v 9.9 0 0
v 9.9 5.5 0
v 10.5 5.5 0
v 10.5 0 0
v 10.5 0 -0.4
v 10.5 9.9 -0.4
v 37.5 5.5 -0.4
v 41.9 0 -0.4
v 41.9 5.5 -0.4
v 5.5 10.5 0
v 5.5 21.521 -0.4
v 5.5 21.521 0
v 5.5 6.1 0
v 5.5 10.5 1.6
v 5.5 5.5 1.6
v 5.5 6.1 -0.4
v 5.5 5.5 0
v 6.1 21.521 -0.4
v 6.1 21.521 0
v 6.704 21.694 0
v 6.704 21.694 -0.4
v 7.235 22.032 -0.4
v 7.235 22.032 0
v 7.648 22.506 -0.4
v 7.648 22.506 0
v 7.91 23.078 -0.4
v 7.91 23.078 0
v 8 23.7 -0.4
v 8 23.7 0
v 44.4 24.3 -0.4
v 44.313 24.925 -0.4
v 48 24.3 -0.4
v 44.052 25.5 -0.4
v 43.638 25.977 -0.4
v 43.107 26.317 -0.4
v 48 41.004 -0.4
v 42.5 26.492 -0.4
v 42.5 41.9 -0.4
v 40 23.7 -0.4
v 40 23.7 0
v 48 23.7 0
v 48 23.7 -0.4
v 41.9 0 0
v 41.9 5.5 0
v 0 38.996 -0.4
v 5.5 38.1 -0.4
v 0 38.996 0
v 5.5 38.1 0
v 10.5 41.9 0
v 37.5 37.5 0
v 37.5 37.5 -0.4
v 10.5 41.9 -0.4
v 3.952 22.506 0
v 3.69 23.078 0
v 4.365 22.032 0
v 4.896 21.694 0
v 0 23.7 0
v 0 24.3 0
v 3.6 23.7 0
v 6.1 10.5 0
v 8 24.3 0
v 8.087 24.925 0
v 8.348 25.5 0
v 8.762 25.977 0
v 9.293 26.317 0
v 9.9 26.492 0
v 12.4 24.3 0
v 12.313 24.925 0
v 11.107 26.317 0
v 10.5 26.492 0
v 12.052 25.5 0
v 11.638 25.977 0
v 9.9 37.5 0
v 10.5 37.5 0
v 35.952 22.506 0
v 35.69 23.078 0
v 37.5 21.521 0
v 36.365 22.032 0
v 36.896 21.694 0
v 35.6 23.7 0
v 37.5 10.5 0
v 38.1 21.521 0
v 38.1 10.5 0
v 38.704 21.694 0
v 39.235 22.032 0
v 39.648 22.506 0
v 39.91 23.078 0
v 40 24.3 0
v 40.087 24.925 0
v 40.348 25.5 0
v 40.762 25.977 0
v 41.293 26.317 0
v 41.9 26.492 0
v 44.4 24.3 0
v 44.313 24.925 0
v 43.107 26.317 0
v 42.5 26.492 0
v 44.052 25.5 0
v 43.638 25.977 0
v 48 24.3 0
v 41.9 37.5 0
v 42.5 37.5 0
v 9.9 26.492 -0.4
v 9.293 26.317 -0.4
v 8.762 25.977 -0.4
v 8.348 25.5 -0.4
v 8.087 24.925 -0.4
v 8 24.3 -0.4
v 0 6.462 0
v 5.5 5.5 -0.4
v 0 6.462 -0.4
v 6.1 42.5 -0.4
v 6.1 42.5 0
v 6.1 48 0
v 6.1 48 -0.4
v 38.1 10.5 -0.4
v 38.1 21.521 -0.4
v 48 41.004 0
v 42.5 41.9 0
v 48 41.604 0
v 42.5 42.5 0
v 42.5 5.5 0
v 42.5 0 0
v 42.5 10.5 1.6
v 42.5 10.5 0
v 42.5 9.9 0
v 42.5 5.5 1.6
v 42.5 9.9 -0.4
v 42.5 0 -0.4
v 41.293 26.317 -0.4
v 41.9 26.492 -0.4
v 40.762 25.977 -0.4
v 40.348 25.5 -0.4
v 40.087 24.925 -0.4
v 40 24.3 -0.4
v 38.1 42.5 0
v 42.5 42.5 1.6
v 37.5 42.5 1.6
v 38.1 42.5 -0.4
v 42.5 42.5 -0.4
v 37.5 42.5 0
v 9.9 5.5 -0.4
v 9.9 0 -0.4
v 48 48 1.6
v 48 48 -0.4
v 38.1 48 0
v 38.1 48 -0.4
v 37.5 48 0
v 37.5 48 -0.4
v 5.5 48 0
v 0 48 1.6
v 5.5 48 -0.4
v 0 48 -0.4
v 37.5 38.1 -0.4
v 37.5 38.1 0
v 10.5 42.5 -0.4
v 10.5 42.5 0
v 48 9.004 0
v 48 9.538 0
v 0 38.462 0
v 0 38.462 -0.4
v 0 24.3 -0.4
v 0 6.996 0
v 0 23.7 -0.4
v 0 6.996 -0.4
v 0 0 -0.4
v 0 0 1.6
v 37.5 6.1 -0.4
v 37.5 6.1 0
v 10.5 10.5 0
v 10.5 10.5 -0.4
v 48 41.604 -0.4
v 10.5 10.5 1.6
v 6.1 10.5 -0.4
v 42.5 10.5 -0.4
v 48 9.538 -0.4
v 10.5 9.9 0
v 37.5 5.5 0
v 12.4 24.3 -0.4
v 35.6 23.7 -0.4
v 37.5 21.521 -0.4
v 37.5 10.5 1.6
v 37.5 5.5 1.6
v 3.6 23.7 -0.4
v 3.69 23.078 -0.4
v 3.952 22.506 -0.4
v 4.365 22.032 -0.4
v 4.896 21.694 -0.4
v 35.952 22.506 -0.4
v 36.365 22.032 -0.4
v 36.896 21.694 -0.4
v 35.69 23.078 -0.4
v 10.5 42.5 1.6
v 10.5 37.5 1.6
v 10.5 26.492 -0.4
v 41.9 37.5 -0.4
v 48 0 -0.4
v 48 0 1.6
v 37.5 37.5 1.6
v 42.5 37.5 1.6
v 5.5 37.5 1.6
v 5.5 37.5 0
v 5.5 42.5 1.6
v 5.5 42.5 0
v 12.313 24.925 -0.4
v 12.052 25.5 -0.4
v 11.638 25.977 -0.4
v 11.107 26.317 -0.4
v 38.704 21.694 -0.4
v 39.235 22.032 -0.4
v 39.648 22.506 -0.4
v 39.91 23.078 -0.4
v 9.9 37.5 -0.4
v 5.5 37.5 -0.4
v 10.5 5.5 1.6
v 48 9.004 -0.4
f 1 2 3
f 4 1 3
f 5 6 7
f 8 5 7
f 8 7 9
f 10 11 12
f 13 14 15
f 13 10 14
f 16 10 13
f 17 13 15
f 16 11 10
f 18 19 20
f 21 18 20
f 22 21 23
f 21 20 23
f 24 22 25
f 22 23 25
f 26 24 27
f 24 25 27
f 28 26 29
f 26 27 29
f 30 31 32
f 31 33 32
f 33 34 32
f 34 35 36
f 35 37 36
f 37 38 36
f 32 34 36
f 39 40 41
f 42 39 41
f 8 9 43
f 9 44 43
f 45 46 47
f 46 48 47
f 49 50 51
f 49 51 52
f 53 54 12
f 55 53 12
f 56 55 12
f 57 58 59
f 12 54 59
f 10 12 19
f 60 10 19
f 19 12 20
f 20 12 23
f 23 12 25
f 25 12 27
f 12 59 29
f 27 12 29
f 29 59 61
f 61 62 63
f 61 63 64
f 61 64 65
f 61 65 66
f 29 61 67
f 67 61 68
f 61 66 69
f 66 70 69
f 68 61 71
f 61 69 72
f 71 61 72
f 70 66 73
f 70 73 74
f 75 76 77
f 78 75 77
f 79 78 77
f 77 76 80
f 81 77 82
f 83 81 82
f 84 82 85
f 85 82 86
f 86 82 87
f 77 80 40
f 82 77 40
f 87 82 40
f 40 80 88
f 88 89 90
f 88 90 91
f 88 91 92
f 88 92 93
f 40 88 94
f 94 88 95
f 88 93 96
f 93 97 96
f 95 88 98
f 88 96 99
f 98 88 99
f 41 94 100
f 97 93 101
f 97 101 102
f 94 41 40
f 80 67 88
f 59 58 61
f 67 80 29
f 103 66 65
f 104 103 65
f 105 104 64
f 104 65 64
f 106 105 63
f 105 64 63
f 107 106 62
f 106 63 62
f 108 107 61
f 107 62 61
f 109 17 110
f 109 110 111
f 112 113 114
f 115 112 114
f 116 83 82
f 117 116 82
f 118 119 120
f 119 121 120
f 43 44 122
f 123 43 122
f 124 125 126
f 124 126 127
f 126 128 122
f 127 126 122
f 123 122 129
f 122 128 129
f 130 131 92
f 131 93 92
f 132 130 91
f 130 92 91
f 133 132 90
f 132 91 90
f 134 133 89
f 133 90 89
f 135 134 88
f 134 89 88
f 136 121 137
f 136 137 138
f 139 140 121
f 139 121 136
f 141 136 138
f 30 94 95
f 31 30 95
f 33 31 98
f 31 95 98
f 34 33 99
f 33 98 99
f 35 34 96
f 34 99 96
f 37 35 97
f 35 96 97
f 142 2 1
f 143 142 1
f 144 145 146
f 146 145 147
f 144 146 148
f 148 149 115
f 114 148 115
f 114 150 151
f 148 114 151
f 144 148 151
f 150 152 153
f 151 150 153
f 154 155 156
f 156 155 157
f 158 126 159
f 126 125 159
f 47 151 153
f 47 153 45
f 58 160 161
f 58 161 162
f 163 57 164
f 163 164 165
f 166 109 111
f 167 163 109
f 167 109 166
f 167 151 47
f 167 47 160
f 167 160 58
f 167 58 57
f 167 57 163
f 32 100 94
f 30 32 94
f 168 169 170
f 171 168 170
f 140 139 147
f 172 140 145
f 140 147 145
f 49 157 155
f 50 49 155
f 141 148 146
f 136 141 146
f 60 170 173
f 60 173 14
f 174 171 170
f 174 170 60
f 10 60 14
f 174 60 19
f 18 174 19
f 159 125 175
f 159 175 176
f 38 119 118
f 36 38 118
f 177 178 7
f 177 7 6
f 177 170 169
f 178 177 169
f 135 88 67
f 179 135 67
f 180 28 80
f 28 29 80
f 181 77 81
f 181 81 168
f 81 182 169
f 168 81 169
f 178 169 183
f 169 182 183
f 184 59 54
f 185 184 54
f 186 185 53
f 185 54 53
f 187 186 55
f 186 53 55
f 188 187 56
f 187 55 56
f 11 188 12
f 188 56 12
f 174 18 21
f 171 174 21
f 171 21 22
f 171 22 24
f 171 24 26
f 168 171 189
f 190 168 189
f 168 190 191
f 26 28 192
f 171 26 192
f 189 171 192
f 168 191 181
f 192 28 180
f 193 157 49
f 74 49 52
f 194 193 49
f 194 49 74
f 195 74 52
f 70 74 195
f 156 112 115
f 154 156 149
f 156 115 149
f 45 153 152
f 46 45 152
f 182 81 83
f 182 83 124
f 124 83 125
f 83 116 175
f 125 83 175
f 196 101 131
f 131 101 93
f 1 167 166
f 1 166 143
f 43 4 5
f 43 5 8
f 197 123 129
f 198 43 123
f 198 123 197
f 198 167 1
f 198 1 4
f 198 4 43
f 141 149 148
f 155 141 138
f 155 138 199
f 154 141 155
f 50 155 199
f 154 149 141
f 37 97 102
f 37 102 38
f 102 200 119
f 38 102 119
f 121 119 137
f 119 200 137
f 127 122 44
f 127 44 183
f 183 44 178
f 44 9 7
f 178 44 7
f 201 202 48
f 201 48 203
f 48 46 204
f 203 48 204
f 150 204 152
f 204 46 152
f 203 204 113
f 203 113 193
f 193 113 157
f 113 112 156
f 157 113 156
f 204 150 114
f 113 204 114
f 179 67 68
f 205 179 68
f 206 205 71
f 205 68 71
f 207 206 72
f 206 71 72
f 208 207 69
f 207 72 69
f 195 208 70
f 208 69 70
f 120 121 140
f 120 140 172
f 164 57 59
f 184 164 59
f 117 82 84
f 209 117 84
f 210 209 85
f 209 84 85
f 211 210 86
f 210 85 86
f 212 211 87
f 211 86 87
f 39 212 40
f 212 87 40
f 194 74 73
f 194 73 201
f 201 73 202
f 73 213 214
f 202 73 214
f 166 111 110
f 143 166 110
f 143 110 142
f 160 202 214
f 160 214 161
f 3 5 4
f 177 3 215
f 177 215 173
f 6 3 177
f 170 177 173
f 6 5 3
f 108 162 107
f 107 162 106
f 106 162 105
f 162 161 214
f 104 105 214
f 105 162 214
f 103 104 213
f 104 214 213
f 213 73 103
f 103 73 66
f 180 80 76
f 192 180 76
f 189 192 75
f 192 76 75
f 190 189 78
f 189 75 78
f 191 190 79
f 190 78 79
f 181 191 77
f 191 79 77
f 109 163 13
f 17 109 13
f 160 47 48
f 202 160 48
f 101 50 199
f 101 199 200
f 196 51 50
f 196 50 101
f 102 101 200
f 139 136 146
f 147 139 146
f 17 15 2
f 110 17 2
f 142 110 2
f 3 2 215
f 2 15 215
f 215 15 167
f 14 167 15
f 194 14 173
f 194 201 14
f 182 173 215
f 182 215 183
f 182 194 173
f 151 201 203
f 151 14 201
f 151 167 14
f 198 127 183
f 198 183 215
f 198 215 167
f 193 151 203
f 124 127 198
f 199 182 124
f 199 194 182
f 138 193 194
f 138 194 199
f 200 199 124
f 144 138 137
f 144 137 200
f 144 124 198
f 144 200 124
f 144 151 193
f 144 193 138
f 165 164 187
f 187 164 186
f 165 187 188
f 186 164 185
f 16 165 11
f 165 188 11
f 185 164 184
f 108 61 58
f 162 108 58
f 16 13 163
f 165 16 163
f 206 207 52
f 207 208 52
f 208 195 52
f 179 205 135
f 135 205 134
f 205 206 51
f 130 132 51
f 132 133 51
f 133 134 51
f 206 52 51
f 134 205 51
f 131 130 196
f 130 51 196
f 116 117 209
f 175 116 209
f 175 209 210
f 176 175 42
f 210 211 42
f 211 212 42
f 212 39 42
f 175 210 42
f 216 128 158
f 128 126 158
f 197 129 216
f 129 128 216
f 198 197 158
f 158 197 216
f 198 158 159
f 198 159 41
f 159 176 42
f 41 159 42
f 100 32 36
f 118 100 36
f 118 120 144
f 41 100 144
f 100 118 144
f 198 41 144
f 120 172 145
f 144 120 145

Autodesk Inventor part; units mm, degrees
ref_plane "YZ Plane" through (0, 0, 0) normal (1, 0, 0) x (0, 1, 0)
ref_plane "XZ Plane" through (0, 0, 0) normal (0, 1, 0) x (-1, 0, 0)
ref_plane "XY Plane" through (0, 0, 0) normal (0, 0, 1) x (1, 0, 0)
sketch "Sketch1" plane through (0, 0, 0) normal (0, 0, 1) x (1, 0, 0)
  line L0 (0, 0) -> (48, 0)
  line L1 (48, 0) -> (48, 48)
  line L2 (48, 48) -> (0, 48)
  line L3 (0, 48) -> (0, 0)
  line L4 (10.5, 10.5) -> (5.5, 10.5)
  line L5 (5.5, 10.5) -> (5.5, 5.5)
  line L6 (5.5, 5.5) -> (10.5, 5.5)
  line L7 (10.5, 5.5) -> (10.5, 10.5)
  line L8 (10.5, 10.5) -> (5.5, 5.5) construction
  line L9 (5.5, 10.5) -> (10.5, 5.5) construction
  line L10 (5.5, 42.5) -> (10.5, 42.5)
  line L11 (10.5, 42.5) -> (10.5, 37.5)
  line L12 (10.5, 37.5) -> (5.5, 37.5)
  line L13 (5.5, 37.5) -> (5.5, 42.5)
  line L14 (5.5, 42.5) -> (10.5, 37.5) construction
  line L15 (10.5, 42.5) -> (5.5, 37.5) construction
  line L16 (42.5, 5.5) -> (37.5, 5.5)
  line L17 (37.5, 5.5) -> (37.5, 10.5)
  line L18 (37.5, 10.5) -> (42.5, 10.5)
  line L19 (42.5, 10.5) -> (42.5, 5.5)
  line L20 (42.5, 5.5) -> (37.5, 10.5) construction
  line L21 (37.5, 5.5) -> (42.5, 10.5) construction
  line L22 (42.5, 42.5) -> (37.5, 42.5)
  line L23 (37.5, 42.5) -> (37.5, 37.5)
  line L24 (37.5, 37.5) -> (42.5, 37.5)
  line L25 (42.5, 37.5) -> (42.5, 42.5)
  line L26 (42.5, 42.5) -> (37.5, 37.5) construction
  line L27 (37.5, 42.5) -> (42.5, 37.5) construction
  line L28 (37.5, 5.5) -> (37.5, 6.1)
  line L29 (37.5, 6.1) -> (10.5, 10.5)
  line L30 (37.5, 5.5) -> (10.5, 9.9)
  line L31 (37.5, 37.5) -> (37.5, 38.1)
  line L32 (37.5, 38.1) -> (10.5, 42.5)
  line L33 (37.5, 37.5) -> (10.5, 41.9)
  line L34 (0, 24) -> (0, 23.7)
  line L35 (0, 23.7) -> (48, 23.7)
  line L36 (48, 23.7) -> (48, 24.3)
  line L37 (48, 24.3) -> (0, 24.3)
  line L38 (0, 24.3) -> (0, 23.7)
  line L39 (5.5, 10.5) -> (6.1, 10.5)
  line L40 (6.1, 10.5) -> (6.1, 23.7)
  line L41 (6.1, 23.7) -> (5.5, 23.7)
  line L42 (5.5, 23.7) -> (5.5, 10.5)
  line L43 (10.5, 37.5) -> (9.9, 37.5)
  line L44 (9.9, 37.5) -> (9.9, 24.3)
  line L45 (9.9, 24.3) -> (10.5, 24.3)
  line L46 (10.5, 24.3) -> (10.5, 37.5)
  line L47 (37.5, 10.5) -> (38.1, 10.5)
  line L48 (38.1, 10.5) -> (38.1, 23.7)
  line L49 (38.1, 23.7) -> (37.5, 23.7)
  line L50 (37.5, 23.7) -> (37.5, 10.5)
  line L51 (42.5, 37.5) -> (41.9, 37.5)
  line L52 (41.9, 37.5) -> (41.9, 24.3)
  line L53 (41.9, 24.3) -> (42.5, 24.3)
  line L54 (42.5, 24.3) -> (42.5, 37.5)
  line L55 (10.5, 5.5) -> (9.9, 5.5)
  line L56 (9.9, 5.5) -> (9.9, 0)
  line L57 (9.9, 0) -> (10.5, 0)
  line L58 (10.5, 0) -> (10.5, 5.5)
  line L59 (42.5, 5.5) -> (41.9, 5.5)
  line L60 (41.9, 5.5) -> (41.9, 0)
  line L61 (41.9, 0) -> (42.5, 0)
  line L62 (42.5, 0) -> (42.5, 5.5)
  line L63 (37.5, 42.5) -> (38.1, 42.5)
  line L64 (38.1, 42.5) -> (38.1, 48)
  line L65 (38.1, 48) -> (37.5, 48)
  line L66 (37.5, 48) -> (37.5, 42.5)
  line L67 (5.5, 42.5) -> (6.1, 42.5)
  line L68 (6.1, 42.5) -> (6.1, 48)
  line L69 (6.1, 48) -> (5.5, 48)
  line L70 (5.5, 48) -> (5.5, 42.5)
  line L71 (5.5, 37.5) -> (0, 38.4621)
  line L72 (5.5, 37.5) -> (11.0835, 37.5) construction
  line L73 (5.5, 37.5) -> (5.5, 38.1)
  line L74 (5.5, 38.1) -> (0, 38.9963)
  line L75 (5.5, 5.5) -> (0, 6.4621)
  line L76 (5.5, 5.5) -> (11.0835, 5.5) construction
  line L77 (5.5, 5.5) -> (5.5, 6.1)
  line L78 (5.5, 6.1) -> (0, 6.9963)
  line L79 (42.5, 10.5) -> (48, 9.5379)
  line L80 (42.5, 10.5) -> (48.0835, 10.5) construction
  line L81 (42.5, 10.5) -> (42.5, 9.9)
  line L82 (42.5, 9.9) -> (48, 9.0037)
  line L83 (42.5, 42.5) -> (48, 41.6037)
  line L84 (42.5, 42.5) -> (42.5, 41.9)
  line L85 (42.5, 41.9) -> (48, 41.0037)
  line L86 (6.1, 24.3) -> (9.9, 24.3)
  line L87 (10.5, 24.3) -> (12.4, 24.3)
  arc A0 (12.4, 24.3) -> (8, 24.3) centre (10.2, 24.3124) ccw
  line L88 (5.5, 23.7) -> (3.6, 23.7)
  arc A1 (3.6, 23.7) -> (8, 23.7) centre (5.8, 23.7) ccw
  line L89 (41.9, 24.3) -> (40, 24.3)
  line L90 (42.5, 24.3) -> (44.4, 24.3)
  line L91 (37.5, 23.7) -> (35.6, 23.7)
  arc A2 (35.6, 23.7) -> (40, 23.7) centre (37.8, 23.7) ccw
  arc A3 (44.4, 24.3) -> (40, 24.3) centre (42.2, 24.3124) ccw
  point P0 (8, 24.3)
  point P1 (9.9, 26.4919)
  point P2 (41.9, 26.4919)
  point P3 (10.5, 26.4919)
  point P4 (42.5, 26.4919)
  point P5 (38.1, 21.5205)
  point P6 (37.5, 21.5206)
  point P7 (6.1, 21.5205)
  point P8 (5.5, 21.5206)
  dimension "d33" = 48
  dimension "d34" = 48
  dimension "d38" = 5
  dimension "d39" = 5
  dimension "d40" = 5
  dimension "d41" = 5
  dimension "d45" = 5
  dimension "d46" = 5
  dimension "d47" = 5
  dimension "d48" = 5
  dimension "d49" = 32
  dimension "d50" = 32
  dimension "d51" = 32
  dimension "d52" = 32
  dimension "d53" = 0.6
  dimension "d54" = 0.6
  dimension "d55" = 0.3
  dimension "d56" = 0.6
  dimension "d57" = 0.6
  dimension "d58" = 0.6
  dimension "d59" = 0.6
  dimension "d60" = 0.6
  dimension "d61" = 0.6
  dimension "d62" = 0.6
  dimension "d63" = 0.6
  dimension "d64" = 0.6
  dimension "d65" = 170.078
  dimension "d66" = 0.6
  dimension "d67" = 170.078
  dimension "d68" = 0.6
  dimension "d69" = 9.922
  dimension "d70" = 0.6
  dimension "d71" = 0.6
  dimension "d72" = 1.9
  dimension "d73" = 1.9
  dimension "d74" = 1.9
  dimension "d75" = 1.9
  dimension "d76" = 1.9
  dimension "d77" = 1.9
extrude "Extrusion1" add sketch "Sketch1" against normal blind 0.4 contours L3 L75 L6 L56 L0 | L58 L7 L30 L16 L60 L0 | L3 L35 A1 L42 L5 L78 | L62 L19 L82 L1 L0 | L4 L40 A1 L35 A2 L50 L17 L29 | L3 L71 L12 L44 A0 L37 | L79 L18 L48 A2 L35 L1 | L3 L2 L70 L13 L74 | L37 A3 L54 L25 L85 L1 | L11 L33 L24 L52 A3 L37 A0 L46 | L2 L66 L23 L32 L10 L68 | L83 L22 L64 L2 L1
extrude "Extrusion2" add sketch "Sketch1" along normal blind 1.6 contours L3 L75 L6 L56 L0 | L56 L6 L58 L0 | L3 L78 L5 L75 | L58 L7 L30 L16 L60 L0 | L3 L35 A1 L42 L5 L78 | L60 L16 L62 L0 | L3 L37 L1 L35 | L62 L19 L82 L1 L0 | L7 L29 L17 L30 | L35 L42 A1 | L42 A1 L40 L4 | L4 L40 A1 L35 A2 L50 L17 L29 | L3 L71 L12 L44 A0 L37 | L35 L40 A1 L42 | L82 L19 L79 L1 | L3 L74 L13 L71 | L35 A1 L40 | L79 L18 L48 A2 L35 L1 | L50 A2 L48 L18 | L3 L2 L70 L13 L74 | A0 L44 L37 | A2 L35 L50 | L50 L35 L48 A2 | L12 L46 A0 L44 | L44 A0 L46 L37 | L37 A3 L54 L25 L85 L1 | A2 L48 L35 | L2 L68 L10 L70 | L11 L33 L24 L52 A3 L37 A0 L46 | L46 A0 L37 | L85 L25 L83 L1 | L37 L54 A3 | L2 L66 L23 L32 L10 L68 | L11 L32 L23 L33 | L83 L22 L64 L2 L1 | L37 L52 A3 L54 | A3 L52 L24 L54 | L2 L64 L22 L66 | A3 L52 L37
properties part number "LED Position"
